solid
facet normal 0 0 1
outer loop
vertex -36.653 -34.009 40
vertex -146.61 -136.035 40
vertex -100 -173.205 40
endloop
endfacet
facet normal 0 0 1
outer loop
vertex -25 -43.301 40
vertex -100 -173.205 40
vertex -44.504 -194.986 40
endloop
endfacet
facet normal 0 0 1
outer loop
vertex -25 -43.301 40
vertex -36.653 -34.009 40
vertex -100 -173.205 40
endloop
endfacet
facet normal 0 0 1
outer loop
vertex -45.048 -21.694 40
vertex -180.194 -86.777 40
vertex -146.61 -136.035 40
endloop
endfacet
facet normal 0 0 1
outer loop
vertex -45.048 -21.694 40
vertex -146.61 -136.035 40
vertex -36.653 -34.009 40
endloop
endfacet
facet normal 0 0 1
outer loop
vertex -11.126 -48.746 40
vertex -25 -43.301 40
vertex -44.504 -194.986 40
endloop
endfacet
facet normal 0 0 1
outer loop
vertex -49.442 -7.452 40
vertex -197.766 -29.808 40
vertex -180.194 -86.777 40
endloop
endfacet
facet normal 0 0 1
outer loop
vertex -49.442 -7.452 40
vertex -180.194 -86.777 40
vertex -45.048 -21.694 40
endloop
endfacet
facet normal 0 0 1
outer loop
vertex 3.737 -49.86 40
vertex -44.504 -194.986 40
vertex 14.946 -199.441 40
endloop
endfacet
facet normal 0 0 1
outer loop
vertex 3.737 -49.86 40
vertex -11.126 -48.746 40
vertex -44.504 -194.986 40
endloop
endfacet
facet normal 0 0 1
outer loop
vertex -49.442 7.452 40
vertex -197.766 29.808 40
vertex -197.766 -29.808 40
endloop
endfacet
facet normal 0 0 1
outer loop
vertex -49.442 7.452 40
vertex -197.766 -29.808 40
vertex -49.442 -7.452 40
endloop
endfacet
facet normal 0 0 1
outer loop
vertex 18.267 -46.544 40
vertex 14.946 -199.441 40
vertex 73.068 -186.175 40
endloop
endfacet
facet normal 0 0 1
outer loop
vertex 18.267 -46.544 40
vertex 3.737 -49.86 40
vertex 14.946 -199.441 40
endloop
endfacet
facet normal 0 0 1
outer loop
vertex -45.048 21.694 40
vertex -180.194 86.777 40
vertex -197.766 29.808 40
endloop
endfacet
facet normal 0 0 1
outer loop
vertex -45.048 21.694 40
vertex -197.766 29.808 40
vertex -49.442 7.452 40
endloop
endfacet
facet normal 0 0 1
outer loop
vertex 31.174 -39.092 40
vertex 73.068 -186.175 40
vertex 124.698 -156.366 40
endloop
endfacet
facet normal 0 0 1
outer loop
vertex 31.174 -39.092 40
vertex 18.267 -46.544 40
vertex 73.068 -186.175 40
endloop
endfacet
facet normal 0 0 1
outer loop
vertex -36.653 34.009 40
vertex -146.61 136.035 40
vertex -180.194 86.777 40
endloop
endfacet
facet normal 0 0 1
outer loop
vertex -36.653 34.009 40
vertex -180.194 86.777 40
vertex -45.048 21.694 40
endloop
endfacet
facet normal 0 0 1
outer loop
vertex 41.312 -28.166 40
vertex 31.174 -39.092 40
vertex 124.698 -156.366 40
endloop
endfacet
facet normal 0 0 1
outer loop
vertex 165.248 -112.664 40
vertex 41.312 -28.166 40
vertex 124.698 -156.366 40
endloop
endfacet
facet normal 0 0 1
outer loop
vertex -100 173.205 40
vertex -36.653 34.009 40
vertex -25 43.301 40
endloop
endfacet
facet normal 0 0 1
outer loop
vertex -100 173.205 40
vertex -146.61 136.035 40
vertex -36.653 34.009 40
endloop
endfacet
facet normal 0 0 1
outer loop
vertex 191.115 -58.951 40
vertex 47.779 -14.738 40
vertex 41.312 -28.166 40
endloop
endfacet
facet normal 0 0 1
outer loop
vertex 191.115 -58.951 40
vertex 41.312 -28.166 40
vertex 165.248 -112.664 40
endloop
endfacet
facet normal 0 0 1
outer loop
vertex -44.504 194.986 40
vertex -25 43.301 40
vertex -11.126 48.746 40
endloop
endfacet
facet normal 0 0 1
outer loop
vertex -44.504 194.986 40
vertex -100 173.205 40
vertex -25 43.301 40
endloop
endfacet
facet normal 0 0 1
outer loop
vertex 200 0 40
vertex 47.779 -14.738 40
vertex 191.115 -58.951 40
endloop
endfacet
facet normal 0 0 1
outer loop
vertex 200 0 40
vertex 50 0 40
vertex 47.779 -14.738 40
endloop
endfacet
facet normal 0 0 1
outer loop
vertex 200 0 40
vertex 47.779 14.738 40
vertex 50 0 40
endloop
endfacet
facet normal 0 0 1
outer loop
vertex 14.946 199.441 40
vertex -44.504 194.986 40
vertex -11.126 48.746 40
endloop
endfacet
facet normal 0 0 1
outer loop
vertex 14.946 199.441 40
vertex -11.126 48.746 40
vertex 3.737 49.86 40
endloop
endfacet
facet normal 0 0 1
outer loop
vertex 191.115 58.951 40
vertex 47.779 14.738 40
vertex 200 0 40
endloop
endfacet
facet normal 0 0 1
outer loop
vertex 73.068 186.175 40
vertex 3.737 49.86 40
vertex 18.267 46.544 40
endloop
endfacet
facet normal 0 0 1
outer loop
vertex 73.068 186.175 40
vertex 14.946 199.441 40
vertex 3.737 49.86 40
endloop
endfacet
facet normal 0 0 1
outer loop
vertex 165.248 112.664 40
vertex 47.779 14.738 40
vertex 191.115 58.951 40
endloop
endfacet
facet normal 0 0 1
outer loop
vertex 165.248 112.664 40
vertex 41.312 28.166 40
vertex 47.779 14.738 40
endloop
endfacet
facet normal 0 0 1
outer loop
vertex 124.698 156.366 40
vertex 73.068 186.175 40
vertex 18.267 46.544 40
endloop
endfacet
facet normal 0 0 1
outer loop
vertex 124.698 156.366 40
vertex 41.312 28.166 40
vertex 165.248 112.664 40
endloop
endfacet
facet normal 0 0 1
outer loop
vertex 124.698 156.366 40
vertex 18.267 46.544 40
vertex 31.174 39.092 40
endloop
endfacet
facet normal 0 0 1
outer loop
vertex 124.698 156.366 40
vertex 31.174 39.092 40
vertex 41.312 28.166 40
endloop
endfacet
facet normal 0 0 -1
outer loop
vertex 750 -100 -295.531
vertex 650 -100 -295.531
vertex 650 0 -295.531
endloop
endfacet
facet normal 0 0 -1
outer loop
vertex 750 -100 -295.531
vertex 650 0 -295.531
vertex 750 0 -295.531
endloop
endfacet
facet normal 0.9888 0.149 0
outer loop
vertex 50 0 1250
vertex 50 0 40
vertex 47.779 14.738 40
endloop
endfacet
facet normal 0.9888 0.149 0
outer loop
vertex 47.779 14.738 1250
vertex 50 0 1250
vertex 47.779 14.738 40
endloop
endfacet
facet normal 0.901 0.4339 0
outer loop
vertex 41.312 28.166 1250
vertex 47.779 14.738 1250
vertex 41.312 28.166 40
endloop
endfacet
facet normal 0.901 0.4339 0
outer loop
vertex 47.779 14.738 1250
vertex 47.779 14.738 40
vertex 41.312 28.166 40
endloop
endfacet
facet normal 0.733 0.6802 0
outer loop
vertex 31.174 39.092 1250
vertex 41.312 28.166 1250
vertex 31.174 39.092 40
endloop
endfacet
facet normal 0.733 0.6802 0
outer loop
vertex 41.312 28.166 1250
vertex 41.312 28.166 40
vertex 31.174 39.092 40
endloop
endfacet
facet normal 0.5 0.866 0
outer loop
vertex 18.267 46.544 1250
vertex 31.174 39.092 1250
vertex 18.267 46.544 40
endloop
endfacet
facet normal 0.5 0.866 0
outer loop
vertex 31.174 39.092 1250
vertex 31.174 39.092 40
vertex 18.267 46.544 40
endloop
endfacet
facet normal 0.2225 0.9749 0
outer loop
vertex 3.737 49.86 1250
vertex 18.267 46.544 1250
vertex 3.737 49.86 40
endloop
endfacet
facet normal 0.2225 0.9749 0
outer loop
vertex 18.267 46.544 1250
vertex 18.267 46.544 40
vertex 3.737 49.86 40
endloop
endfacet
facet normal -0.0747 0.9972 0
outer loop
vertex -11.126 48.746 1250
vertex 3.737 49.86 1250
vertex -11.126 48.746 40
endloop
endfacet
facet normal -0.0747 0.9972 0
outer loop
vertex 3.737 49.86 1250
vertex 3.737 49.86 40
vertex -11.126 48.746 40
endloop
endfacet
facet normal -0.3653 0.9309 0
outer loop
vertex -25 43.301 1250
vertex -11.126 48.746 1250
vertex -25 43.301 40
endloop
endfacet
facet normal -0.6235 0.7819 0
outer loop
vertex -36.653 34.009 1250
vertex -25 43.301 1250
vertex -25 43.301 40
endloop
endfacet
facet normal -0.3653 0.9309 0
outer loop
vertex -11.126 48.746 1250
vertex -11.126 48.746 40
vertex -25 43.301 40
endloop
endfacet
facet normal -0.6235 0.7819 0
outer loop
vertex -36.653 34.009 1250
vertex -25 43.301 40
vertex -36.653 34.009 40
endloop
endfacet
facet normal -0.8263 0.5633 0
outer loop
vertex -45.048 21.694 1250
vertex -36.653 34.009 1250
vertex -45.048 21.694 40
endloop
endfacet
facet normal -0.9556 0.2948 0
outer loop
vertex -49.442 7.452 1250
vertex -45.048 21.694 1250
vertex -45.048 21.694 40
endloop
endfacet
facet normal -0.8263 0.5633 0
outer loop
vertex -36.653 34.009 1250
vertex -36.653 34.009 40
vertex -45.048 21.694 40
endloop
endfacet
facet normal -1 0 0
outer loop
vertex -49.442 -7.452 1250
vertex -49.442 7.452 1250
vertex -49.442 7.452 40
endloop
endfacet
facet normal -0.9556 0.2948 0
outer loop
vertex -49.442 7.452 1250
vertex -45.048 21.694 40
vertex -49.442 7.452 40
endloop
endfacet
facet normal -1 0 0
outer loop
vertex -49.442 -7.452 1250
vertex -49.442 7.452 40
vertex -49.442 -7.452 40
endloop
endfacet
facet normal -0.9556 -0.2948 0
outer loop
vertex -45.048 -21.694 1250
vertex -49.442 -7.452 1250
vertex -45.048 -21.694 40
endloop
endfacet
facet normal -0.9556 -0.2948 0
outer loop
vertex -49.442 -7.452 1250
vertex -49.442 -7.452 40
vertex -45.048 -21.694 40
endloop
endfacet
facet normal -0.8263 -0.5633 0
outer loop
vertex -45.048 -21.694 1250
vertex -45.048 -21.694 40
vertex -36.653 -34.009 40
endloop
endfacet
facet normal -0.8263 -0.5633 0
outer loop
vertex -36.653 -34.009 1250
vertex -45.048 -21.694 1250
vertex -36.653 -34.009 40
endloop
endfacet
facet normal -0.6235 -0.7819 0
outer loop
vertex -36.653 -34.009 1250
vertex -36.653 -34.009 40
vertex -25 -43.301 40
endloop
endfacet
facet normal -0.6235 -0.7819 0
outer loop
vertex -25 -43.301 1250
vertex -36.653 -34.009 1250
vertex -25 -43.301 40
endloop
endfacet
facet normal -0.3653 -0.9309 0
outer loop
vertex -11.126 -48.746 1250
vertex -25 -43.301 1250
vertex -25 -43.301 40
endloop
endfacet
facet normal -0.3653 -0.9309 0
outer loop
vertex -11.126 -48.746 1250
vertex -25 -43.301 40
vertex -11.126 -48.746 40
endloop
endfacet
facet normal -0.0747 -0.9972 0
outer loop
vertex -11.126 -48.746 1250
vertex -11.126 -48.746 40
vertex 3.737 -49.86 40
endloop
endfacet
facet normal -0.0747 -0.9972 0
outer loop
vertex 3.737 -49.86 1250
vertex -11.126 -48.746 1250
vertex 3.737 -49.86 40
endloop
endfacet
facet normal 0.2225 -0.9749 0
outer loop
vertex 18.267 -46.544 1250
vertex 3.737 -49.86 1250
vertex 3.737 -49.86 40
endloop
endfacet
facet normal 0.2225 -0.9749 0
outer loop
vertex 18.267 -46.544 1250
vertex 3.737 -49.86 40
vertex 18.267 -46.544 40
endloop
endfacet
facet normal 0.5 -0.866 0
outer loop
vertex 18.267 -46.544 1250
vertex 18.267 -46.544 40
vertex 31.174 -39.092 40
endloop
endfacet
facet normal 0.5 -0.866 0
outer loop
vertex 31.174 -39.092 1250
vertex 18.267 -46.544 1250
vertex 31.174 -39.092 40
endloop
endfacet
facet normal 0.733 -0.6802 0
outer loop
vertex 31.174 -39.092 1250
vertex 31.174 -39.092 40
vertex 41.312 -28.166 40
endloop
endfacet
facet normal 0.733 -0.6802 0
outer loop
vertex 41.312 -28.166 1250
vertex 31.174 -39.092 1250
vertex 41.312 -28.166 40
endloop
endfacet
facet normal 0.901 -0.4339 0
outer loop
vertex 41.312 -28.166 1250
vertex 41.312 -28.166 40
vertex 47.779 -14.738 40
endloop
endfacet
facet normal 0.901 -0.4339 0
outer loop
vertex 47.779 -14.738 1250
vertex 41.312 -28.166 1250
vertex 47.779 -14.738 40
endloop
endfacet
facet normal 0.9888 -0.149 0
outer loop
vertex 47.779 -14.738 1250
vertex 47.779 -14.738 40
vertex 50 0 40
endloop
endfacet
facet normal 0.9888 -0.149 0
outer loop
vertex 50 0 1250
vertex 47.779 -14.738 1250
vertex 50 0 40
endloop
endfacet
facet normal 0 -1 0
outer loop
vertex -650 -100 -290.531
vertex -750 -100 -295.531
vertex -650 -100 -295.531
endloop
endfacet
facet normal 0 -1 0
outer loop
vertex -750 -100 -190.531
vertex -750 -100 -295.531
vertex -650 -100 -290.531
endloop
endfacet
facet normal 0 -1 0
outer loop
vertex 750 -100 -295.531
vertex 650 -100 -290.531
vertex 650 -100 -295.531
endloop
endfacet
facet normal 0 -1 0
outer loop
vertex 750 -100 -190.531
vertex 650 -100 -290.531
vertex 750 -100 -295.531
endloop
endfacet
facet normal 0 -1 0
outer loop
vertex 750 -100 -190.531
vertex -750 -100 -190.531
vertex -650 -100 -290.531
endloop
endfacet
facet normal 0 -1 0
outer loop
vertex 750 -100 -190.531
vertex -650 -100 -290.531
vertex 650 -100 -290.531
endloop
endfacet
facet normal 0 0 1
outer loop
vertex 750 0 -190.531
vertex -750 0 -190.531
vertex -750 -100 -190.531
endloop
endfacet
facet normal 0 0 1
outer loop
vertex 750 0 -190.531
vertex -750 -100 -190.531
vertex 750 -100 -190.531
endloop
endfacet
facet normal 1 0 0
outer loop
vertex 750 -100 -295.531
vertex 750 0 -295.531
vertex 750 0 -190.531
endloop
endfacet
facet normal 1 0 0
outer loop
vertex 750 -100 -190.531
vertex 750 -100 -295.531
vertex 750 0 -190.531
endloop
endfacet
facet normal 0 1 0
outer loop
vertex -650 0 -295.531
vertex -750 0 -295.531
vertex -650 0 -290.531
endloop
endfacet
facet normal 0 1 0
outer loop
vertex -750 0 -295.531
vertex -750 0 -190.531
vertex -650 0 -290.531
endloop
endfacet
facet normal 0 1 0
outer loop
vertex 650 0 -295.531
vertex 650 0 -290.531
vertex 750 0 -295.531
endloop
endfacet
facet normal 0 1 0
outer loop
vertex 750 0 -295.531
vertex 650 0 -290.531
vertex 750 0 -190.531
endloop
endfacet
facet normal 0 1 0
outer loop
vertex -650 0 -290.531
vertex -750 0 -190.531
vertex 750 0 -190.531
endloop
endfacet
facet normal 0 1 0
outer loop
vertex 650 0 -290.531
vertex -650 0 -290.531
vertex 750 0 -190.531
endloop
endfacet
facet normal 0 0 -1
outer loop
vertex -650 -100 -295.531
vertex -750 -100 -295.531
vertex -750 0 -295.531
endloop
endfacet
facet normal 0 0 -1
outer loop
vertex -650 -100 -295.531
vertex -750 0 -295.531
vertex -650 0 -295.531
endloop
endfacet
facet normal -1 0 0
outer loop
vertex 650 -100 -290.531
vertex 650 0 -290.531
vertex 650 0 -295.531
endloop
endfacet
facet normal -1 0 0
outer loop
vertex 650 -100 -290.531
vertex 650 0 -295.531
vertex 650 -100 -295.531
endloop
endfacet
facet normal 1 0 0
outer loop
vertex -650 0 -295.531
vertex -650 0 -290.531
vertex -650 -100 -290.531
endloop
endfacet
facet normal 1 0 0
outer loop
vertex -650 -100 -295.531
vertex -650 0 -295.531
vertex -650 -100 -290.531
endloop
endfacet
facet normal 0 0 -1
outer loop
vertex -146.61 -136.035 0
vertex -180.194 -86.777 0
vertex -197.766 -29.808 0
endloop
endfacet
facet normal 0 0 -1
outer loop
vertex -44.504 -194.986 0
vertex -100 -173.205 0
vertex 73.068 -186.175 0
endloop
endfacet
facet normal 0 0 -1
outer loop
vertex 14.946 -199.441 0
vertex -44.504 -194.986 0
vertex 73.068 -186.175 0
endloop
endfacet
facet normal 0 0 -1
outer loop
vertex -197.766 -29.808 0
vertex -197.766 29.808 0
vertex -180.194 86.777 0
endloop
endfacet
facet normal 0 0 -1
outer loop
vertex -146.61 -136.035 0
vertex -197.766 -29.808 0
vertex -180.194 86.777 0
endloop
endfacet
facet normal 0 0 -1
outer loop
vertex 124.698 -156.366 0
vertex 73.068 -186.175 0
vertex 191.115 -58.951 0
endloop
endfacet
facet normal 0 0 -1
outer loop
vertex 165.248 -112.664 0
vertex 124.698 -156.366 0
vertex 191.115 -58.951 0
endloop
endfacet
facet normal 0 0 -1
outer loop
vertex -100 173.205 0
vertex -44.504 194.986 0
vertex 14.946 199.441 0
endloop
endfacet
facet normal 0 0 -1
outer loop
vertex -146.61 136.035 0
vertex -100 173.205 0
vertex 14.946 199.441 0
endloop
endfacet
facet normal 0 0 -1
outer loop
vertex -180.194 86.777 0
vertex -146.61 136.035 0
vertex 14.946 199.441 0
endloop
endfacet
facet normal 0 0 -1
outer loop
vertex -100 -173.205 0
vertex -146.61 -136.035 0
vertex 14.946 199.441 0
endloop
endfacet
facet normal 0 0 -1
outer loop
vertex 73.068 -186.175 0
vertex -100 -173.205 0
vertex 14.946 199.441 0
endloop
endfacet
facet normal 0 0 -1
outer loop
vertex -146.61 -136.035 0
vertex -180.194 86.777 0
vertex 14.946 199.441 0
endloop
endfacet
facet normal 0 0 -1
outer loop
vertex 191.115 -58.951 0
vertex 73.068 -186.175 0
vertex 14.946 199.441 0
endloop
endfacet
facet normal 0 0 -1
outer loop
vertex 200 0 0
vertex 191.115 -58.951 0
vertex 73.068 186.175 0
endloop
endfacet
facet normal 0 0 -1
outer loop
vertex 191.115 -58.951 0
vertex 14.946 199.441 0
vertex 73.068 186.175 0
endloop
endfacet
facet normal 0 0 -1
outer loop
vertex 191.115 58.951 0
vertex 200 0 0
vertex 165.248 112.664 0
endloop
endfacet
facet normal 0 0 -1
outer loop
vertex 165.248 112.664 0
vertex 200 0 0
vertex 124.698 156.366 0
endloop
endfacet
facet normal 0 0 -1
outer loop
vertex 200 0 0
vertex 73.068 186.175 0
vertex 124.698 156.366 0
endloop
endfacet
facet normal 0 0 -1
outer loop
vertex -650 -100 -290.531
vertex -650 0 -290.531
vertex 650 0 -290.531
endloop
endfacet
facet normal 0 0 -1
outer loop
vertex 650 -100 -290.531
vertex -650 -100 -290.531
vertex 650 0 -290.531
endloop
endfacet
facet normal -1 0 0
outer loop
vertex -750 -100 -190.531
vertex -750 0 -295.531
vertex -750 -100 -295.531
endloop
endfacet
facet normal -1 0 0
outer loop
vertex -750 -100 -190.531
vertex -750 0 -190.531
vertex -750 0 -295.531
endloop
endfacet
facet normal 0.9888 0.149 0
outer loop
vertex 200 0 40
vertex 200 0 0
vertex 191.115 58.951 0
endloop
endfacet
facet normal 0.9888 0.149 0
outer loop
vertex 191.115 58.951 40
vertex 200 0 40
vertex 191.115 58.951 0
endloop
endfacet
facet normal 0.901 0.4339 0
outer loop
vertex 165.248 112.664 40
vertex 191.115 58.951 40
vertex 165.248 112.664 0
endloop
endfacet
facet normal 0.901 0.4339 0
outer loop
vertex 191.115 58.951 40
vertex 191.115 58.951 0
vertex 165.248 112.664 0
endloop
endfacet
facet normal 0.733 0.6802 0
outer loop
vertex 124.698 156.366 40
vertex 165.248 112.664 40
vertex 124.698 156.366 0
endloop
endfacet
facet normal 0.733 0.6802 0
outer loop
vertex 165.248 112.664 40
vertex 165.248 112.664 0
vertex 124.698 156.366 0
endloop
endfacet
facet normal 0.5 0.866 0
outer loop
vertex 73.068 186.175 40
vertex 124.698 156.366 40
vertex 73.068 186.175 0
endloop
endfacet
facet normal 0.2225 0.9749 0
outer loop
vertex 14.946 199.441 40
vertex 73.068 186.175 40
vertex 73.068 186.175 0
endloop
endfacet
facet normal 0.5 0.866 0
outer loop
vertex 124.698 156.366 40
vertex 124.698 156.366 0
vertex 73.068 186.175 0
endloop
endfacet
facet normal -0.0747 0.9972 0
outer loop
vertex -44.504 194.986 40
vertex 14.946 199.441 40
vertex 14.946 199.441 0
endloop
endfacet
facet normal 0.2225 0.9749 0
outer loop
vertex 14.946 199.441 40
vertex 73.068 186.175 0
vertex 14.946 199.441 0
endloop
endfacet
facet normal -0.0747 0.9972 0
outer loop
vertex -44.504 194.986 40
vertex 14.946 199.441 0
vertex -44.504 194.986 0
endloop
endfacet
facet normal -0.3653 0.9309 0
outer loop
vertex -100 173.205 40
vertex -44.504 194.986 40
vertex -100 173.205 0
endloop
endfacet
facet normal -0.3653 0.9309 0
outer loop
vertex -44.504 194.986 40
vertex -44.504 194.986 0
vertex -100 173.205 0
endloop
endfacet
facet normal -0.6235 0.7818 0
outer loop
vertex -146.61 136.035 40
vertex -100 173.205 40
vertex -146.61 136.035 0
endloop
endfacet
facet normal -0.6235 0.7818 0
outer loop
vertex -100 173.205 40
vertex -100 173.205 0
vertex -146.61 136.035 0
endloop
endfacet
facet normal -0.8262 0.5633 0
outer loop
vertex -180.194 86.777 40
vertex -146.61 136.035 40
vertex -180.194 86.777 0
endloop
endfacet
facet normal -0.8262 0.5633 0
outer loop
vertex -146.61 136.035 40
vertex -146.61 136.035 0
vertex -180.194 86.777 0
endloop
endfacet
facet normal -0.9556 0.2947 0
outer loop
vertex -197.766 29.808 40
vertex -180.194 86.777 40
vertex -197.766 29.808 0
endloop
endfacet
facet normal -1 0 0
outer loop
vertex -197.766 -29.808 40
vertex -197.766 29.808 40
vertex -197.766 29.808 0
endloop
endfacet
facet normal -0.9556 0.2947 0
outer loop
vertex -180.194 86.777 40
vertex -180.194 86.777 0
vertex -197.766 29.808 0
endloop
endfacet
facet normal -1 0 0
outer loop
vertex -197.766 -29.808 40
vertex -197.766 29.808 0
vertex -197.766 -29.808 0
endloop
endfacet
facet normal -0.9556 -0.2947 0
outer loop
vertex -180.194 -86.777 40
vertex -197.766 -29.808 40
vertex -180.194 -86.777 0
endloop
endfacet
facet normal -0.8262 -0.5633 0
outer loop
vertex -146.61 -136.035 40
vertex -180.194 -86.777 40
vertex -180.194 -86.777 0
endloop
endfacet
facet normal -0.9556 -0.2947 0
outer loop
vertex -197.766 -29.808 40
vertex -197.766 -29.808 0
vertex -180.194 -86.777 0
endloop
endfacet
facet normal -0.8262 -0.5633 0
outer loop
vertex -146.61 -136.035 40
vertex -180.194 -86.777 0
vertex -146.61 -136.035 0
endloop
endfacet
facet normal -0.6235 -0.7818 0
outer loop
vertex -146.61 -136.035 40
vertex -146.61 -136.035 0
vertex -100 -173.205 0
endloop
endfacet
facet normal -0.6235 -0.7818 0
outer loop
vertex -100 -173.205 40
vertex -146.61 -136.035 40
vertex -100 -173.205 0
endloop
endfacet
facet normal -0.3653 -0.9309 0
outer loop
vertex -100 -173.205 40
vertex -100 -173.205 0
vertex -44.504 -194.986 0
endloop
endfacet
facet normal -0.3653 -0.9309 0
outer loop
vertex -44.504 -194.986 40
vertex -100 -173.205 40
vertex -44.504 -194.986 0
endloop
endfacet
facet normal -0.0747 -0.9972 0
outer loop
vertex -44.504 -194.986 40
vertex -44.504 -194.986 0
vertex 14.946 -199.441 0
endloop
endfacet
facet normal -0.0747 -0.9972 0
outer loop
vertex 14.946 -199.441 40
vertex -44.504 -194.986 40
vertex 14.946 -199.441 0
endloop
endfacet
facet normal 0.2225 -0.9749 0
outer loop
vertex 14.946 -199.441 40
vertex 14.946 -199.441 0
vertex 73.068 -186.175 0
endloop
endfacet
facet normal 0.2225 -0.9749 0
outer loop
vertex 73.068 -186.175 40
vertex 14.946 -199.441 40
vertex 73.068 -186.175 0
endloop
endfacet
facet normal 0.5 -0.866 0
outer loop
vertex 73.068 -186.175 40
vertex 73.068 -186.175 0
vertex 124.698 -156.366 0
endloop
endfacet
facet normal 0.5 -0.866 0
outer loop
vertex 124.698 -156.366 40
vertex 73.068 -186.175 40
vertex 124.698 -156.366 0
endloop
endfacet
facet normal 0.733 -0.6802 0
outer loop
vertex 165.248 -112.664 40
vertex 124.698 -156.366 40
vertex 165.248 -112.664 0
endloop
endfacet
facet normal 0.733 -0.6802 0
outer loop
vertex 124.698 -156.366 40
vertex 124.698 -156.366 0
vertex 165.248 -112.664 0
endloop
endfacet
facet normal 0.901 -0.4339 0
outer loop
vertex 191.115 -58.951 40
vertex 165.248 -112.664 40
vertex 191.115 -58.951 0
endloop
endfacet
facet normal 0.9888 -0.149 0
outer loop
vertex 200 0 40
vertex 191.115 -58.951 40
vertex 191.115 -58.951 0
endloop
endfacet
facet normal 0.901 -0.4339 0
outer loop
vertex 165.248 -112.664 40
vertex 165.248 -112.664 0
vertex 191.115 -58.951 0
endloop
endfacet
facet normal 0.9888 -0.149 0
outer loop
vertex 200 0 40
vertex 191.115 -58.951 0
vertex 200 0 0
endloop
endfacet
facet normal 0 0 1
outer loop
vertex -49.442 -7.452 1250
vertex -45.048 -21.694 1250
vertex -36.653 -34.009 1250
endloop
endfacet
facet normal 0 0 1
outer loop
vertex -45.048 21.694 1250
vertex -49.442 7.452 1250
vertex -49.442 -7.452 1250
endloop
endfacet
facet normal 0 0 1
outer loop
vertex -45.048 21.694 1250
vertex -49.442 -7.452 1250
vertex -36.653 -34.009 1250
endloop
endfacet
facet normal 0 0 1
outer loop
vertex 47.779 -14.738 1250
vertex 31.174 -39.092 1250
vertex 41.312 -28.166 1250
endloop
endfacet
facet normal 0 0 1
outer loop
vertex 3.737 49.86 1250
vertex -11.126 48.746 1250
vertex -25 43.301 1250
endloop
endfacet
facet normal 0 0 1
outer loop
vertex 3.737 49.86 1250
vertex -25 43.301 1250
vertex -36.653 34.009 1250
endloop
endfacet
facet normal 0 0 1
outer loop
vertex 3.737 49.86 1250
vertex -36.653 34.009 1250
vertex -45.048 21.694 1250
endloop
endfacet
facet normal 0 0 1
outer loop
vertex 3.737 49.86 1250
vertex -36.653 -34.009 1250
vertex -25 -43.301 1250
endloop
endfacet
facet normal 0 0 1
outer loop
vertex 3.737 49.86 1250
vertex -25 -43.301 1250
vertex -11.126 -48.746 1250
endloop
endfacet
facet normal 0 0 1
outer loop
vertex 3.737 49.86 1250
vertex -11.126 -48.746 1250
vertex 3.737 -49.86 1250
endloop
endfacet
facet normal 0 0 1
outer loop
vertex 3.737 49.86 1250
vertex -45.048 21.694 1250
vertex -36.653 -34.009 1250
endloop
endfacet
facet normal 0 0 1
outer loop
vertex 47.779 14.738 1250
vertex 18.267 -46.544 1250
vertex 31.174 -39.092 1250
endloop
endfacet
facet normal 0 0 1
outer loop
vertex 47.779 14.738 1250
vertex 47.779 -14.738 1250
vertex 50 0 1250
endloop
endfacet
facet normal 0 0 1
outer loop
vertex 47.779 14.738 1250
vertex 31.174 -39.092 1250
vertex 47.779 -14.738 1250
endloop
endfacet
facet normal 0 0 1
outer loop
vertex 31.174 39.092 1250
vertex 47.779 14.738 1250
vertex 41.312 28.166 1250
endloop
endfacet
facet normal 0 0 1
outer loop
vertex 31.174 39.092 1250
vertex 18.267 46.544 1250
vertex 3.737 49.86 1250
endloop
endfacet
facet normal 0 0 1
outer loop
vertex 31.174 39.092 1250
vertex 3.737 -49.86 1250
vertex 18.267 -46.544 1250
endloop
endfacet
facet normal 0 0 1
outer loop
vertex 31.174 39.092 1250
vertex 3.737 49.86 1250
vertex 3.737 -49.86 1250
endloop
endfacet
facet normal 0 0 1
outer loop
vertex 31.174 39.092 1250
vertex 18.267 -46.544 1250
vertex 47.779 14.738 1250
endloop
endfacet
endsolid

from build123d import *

# Parameters (mm, degrees)
F0_R     = 200
F0_R_2   = 50
F1_DEPTH = 40
F2_DEPTH = 1250
F3_W     = 1500
F3_H     = 100
F4_DEPTH = 100
F5_W     = 100
F5_H     = 100
F6_DEPTH = 5


with BuildPart() as f1:
    # F0 (on Top) → F1 (new body)
    with BuildSketch(Plane.XY):
        Circle(F0_R)
        Circle(F0_R_2, mode=Mode.SUBTRACT)
        Circle(F0_R_2)
    extrude(amount=F1_DEPTH)

    # F0 (on Top) → F2 (join)
    with BuildSketch(Plane.XY):
        Circle(F0_R_2)
    extrude(amount=F2_DEPTH)


with BuildPart() as f4:
    # F3 (on Front) → F4 (new body)
    with BuildSketch(Plane.XZ):
        with Locations((0, -240.531479)):
            Rectangle(F3_W, F3_H)
    extrude(amount=F4_DEPTH)

    # F5 (on face) → F6 (join)
    with BuildSketch(Plane(origin=(0, 0, -290.531479), x_dir=(1, 0, 0), z_dir=(0, 0, -1))):
        with Locations((-700, 50)):
            Rectangle(F5_W, F5_H)
        with Locations((700, 50)):
            Rectangle(F5_W, F5_H)
    extrude(amount=F6_DEPTH)


solid = Compound([f1.part, f4.part])
